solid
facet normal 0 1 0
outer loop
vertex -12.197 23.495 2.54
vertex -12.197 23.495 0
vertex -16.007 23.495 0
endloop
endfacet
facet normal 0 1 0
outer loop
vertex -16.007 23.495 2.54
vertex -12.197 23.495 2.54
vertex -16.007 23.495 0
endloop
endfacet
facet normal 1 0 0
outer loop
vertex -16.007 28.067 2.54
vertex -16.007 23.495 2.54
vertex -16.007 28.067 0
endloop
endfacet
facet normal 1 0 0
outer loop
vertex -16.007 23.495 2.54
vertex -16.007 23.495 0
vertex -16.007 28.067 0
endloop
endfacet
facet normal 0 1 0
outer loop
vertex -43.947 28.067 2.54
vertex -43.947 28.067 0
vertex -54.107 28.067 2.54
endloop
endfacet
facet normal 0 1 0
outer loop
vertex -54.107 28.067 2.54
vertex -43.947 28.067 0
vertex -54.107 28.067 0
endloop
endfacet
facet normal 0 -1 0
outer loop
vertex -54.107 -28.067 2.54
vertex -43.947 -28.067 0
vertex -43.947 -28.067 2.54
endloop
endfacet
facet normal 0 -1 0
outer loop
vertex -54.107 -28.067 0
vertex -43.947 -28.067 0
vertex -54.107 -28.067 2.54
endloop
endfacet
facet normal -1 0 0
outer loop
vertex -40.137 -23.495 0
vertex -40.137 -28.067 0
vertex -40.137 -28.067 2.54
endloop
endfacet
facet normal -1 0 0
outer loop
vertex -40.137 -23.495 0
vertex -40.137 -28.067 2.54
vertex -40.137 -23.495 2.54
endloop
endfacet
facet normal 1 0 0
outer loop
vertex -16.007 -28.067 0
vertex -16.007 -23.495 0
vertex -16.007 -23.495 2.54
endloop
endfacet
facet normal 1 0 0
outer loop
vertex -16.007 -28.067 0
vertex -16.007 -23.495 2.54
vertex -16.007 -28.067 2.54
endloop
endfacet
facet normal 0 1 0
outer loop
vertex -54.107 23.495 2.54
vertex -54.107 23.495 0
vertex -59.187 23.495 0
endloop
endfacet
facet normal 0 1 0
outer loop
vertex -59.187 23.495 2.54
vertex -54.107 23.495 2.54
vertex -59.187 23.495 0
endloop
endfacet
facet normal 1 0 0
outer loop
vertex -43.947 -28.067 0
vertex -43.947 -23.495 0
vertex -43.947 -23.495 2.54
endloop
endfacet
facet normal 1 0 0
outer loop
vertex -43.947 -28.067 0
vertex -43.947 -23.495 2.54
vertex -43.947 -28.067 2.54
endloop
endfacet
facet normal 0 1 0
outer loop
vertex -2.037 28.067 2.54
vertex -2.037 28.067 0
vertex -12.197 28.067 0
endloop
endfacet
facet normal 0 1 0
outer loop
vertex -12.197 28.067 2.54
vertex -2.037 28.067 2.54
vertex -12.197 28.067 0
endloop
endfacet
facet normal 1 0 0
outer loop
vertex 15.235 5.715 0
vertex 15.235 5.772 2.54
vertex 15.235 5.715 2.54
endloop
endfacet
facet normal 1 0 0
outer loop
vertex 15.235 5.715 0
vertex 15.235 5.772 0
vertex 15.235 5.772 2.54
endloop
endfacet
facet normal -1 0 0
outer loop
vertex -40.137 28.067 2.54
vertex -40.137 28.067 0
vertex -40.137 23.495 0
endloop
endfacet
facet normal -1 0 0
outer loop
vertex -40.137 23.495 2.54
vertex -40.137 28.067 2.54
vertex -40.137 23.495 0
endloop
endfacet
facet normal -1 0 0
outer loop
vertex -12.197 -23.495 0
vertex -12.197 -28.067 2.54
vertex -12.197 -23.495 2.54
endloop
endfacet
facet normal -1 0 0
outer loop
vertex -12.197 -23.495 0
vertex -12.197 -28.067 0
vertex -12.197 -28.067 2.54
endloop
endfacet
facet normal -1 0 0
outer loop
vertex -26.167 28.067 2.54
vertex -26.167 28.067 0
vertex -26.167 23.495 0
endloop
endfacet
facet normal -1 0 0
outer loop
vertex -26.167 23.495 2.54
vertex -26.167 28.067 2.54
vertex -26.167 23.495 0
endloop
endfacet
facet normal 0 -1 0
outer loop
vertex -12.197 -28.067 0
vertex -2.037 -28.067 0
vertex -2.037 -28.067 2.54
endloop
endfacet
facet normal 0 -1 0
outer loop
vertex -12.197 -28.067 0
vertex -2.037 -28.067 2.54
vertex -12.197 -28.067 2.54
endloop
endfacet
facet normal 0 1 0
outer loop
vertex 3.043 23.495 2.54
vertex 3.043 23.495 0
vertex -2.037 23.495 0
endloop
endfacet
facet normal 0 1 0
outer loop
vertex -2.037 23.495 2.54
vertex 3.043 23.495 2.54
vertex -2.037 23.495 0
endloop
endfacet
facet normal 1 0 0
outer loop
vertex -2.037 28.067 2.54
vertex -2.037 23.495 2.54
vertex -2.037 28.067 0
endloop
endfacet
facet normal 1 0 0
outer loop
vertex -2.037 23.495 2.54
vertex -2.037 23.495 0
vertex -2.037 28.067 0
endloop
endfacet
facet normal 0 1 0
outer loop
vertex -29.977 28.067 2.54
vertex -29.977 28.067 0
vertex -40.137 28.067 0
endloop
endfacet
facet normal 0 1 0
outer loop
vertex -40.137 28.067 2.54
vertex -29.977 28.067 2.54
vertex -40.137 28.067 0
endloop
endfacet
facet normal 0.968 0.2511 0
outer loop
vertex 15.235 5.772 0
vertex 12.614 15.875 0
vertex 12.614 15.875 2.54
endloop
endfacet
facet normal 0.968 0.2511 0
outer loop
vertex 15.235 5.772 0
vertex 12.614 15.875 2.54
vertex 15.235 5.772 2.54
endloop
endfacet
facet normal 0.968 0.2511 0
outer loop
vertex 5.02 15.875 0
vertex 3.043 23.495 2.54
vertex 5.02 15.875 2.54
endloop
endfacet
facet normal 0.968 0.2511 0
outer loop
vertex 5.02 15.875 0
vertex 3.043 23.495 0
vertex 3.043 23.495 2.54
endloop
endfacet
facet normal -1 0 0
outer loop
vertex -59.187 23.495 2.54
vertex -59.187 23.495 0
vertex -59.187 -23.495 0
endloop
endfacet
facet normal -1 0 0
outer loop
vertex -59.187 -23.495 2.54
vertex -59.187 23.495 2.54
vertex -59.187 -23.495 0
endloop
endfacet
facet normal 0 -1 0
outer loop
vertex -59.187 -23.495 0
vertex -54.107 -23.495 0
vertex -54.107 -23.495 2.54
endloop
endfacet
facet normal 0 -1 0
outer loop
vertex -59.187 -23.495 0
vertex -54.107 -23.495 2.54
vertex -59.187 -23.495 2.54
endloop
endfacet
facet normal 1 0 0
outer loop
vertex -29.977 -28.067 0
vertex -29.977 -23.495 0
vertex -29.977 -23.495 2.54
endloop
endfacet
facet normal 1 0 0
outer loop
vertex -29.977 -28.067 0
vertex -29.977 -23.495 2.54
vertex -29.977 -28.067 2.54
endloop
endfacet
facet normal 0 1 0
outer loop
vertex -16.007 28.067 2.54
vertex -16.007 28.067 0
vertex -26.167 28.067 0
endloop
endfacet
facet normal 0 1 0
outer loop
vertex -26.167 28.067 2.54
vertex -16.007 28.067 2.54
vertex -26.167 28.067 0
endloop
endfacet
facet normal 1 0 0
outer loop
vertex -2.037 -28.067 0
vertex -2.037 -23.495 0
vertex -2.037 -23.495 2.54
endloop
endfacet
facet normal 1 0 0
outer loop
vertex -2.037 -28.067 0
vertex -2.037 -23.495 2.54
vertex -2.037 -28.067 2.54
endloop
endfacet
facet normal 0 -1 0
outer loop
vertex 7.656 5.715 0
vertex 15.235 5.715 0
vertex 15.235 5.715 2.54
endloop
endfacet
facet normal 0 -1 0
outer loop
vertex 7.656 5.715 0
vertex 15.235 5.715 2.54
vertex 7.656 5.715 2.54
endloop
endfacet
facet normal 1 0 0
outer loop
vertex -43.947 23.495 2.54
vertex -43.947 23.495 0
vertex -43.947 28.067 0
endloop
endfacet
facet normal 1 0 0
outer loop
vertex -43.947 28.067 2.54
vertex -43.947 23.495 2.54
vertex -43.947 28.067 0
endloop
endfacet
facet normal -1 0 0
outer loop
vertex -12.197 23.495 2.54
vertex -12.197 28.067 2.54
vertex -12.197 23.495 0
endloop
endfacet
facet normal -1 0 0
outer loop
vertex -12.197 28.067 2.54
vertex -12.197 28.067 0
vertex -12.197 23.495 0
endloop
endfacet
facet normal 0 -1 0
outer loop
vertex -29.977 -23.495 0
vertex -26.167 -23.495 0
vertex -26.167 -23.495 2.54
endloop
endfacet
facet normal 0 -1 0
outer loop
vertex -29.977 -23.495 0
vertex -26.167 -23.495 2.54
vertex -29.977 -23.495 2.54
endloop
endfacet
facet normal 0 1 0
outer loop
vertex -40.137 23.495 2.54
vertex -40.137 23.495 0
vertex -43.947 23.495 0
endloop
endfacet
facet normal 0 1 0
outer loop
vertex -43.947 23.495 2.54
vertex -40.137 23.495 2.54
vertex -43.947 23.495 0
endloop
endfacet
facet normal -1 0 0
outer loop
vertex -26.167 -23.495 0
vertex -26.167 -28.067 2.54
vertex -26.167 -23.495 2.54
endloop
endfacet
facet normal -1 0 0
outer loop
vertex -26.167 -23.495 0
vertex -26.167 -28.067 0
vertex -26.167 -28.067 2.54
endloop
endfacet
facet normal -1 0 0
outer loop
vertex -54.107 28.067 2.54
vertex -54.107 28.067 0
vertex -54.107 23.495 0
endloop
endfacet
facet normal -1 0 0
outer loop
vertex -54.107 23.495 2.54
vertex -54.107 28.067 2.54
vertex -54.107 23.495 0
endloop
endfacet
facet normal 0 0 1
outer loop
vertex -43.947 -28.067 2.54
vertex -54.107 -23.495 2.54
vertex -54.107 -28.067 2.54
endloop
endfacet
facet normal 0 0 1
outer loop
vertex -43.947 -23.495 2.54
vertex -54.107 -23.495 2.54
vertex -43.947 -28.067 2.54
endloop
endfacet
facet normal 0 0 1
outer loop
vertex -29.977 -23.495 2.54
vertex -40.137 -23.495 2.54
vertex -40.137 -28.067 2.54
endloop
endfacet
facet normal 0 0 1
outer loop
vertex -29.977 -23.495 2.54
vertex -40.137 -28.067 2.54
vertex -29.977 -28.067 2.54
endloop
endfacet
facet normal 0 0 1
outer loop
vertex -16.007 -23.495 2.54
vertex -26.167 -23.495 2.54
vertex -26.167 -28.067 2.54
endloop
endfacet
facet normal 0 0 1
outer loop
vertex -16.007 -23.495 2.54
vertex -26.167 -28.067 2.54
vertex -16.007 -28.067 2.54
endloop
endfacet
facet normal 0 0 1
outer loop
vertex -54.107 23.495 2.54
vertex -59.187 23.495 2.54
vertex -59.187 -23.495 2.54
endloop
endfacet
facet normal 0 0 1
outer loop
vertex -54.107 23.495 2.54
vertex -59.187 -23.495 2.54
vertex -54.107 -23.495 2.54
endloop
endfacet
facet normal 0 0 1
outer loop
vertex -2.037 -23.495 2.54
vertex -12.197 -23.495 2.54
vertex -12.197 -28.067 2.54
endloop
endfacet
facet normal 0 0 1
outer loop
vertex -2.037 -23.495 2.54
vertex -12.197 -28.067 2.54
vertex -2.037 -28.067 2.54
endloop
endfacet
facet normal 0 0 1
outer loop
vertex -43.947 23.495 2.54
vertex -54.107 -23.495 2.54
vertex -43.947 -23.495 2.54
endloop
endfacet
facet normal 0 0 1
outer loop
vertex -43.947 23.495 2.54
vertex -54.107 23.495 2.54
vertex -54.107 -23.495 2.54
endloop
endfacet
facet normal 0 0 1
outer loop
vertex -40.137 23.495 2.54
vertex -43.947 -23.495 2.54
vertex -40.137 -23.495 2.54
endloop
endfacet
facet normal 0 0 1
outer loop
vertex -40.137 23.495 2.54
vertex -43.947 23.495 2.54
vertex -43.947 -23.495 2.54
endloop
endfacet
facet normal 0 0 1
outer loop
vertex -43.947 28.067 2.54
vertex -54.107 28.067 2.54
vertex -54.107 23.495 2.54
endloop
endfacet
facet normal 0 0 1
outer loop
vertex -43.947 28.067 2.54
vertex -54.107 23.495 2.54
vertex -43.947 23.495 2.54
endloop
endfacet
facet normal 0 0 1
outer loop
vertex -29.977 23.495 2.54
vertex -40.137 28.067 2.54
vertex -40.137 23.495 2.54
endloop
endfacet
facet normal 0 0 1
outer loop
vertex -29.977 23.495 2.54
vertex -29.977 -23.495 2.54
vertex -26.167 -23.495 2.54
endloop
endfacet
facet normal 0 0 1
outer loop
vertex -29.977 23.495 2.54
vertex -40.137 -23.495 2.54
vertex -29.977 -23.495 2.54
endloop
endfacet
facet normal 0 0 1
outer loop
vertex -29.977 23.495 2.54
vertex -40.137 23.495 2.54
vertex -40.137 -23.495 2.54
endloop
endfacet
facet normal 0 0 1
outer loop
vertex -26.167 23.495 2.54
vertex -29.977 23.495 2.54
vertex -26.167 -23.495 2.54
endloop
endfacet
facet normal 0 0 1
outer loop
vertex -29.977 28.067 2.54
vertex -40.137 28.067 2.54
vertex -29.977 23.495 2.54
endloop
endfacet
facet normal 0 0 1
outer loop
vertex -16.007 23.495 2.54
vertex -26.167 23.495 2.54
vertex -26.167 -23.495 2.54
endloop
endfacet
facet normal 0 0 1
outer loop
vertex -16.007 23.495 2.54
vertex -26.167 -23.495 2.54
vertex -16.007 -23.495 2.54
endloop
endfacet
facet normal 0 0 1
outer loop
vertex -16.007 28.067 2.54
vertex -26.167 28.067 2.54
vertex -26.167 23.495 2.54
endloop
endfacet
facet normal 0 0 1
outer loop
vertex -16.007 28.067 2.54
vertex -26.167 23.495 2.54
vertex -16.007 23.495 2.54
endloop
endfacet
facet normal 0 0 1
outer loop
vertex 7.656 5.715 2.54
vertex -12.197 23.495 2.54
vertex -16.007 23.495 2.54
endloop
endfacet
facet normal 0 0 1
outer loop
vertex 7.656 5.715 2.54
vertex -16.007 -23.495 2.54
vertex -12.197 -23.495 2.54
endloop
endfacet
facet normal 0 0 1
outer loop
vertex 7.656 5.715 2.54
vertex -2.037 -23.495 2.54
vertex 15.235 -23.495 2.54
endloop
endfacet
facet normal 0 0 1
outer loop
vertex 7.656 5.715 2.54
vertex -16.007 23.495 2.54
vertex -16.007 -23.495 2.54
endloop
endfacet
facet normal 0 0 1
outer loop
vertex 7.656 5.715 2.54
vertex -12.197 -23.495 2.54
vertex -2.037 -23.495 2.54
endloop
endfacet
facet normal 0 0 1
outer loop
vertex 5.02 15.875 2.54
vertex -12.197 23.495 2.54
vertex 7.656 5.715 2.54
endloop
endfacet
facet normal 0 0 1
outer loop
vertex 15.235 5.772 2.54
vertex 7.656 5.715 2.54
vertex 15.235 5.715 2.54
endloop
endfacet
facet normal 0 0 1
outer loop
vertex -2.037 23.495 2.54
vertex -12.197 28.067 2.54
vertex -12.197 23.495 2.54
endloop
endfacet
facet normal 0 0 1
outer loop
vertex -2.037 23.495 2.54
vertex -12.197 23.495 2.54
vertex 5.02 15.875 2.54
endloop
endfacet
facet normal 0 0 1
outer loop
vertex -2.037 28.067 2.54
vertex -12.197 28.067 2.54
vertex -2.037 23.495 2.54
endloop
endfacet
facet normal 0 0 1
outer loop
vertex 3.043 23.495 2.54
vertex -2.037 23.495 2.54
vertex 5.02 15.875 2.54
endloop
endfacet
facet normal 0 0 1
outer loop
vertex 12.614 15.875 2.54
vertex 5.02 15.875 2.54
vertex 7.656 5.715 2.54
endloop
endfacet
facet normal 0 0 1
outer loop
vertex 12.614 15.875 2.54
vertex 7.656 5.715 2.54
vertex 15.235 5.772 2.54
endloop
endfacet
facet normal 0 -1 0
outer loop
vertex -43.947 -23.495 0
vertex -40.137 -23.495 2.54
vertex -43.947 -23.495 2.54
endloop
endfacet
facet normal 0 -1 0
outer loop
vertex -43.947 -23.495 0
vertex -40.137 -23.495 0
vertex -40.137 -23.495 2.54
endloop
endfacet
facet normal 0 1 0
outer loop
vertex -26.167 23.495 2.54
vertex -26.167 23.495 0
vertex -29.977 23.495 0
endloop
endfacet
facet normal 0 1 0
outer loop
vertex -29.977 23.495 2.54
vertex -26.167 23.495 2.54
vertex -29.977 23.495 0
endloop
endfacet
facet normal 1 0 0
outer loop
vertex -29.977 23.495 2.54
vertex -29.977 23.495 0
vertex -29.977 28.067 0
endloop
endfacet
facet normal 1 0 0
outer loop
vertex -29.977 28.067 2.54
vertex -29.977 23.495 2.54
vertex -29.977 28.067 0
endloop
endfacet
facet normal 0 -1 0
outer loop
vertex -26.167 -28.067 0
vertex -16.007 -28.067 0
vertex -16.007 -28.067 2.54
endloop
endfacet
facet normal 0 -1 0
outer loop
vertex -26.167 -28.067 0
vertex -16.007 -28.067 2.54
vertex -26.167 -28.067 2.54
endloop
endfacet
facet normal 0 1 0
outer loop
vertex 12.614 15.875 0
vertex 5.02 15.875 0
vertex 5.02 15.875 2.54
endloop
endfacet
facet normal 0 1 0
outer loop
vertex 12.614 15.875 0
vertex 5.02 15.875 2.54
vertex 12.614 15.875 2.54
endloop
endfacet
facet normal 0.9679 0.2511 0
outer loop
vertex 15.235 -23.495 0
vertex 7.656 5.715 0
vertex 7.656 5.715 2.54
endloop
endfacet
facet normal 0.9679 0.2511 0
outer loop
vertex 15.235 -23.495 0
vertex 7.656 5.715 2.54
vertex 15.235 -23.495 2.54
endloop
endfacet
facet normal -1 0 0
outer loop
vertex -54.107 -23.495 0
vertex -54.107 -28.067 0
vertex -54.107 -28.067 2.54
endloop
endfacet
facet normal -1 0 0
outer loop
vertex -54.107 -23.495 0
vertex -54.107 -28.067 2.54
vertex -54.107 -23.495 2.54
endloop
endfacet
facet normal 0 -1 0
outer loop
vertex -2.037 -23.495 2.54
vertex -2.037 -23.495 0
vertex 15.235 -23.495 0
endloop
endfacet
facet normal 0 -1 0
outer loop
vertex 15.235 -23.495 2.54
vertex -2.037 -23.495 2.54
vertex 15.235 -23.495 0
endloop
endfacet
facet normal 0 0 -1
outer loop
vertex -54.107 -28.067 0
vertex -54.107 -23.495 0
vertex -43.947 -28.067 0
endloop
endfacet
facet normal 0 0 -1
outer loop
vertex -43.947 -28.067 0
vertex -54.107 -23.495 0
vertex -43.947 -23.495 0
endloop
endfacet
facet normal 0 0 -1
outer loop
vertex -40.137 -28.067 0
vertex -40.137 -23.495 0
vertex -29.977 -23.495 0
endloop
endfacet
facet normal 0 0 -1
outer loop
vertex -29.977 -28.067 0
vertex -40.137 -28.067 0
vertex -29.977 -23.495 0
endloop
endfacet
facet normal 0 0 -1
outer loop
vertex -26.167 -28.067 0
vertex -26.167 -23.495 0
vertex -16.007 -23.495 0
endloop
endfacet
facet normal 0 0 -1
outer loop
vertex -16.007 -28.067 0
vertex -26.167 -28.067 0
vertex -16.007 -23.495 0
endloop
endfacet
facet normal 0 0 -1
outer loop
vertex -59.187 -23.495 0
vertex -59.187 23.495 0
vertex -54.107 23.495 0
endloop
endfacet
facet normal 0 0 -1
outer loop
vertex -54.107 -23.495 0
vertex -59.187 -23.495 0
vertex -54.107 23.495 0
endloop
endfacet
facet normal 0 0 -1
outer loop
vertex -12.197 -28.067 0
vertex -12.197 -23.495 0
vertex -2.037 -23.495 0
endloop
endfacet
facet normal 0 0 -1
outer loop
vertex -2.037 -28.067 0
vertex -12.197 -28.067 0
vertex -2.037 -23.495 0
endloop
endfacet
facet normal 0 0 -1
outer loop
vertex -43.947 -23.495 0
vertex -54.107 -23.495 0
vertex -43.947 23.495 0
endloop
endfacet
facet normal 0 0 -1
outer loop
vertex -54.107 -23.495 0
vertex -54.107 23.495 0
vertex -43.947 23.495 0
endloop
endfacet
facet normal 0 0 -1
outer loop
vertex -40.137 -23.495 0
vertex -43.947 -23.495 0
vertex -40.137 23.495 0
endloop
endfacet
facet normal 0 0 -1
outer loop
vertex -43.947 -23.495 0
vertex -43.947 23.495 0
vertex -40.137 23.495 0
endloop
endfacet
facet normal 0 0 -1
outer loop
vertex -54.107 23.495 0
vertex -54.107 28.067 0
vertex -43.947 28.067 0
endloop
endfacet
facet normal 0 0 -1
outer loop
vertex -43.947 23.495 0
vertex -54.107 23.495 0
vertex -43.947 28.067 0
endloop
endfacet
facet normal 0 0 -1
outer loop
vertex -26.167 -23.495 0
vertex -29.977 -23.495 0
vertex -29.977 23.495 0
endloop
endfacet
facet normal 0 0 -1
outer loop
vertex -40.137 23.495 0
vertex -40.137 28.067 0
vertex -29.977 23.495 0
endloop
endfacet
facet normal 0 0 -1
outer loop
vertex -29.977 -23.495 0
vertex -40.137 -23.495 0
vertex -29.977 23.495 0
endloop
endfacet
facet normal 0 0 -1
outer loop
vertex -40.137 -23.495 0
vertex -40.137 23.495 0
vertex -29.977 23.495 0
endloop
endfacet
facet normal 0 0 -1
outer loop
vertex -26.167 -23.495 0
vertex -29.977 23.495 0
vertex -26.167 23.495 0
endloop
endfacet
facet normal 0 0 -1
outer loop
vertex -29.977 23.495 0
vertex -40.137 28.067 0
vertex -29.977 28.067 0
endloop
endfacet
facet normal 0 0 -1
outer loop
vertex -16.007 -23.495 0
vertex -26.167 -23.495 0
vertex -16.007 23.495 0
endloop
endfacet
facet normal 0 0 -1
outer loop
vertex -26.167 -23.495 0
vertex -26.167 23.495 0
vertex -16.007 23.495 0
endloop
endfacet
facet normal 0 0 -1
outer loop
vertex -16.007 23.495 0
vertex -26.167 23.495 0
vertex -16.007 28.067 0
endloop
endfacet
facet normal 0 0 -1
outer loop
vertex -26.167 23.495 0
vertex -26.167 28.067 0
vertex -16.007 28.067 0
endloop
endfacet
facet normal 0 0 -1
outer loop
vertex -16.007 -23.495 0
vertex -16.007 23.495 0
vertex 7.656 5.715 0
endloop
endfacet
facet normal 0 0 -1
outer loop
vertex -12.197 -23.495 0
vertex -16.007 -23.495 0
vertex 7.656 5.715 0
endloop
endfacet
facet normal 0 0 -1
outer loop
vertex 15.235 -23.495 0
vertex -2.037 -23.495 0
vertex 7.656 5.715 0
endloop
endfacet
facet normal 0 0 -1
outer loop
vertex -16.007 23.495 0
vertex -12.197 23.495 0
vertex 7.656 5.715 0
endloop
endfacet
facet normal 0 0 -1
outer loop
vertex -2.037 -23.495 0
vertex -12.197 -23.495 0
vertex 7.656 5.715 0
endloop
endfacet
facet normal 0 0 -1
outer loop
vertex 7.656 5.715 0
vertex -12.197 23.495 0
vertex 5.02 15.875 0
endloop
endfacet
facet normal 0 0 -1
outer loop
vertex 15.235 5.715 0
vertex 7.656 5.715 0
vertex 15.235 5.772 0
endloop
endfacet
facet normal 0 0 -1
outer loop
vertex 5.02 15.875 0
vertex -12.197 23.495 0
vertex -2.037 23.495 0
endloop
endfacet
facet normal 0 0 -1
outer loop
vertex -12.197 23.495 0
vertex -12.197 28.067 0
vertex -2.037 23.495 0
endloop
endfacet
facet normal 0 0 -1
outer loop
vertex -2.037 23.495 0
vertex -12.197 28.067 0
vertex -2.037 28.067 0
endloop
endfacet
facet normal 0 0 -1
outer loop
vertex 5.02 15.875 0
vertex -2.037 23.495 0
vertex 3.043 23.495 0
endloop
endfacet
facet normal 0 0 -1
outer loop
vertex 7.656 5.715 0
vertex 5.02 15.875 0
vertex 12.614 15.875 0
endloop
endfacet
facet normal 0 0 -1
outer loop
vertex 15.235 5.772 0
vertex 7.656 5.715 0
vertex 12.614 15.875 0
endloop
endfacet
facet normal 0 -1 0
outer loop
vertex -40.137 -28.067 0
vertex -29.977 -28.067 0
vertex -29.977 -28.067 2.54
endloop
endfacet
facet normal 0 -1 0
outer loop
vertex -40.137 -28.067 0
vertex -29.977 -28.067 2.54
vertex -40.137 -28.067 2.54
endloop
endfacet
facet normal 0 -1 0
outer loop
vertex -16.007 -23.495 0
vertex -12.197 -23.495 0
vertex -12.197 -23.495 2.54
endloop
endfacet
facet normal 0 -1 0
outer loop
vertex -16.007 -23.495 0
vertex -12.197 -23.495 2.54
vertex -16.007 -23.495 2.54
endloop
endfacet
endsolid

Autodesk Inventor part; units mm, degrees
ref_plane "YZ Plane" through (0, 0, 0) normal (1, 0, 0) x (0, 1, 0)
ref_plane "XZ Plane" through (0, 0, 0) normal (0, 1, 0) x (-1, 0, 0)
ref_plane "XY Plane" through (0, 0, 0) normal (0, 0, 1) x (1, 0, 0)
sketch "Sketch1" plane through (0, 0, 0) normal (0, 0, 1) x (1, 0, 0)
  line L0 (-2.037, -23.495) -> (-2.037, -28.067)
  line L1 (-2.037, -28.067) -> (-12.197, -28.067)
  line L2 (-12.197, -28.067) -> (-12.197, -23.495)
  line L3 (-12.197, -23.495) -> (-16.007, -23.495)
  line L4 (-16.007, -23.495) -> (-16.007, -28.067)
  line L5 (-16.007, -28.067) -> (-26.167, -28.067)
  line L6 (-26.167, -28.067) -> (-26.167, -23.495)
  line L7 (-26.167, -23.495) -> (-29.977, -23.495)
  line L8 (-29.977, -23.495) -> (-29.977, -28.067)
  line L9 (-29.977, -28.067) -> (-40.137, -28.067)
  line L10 (-40.137, -28.067) -> (-40.137, -23.495)
  line L11 (-40.137, -23.495) -> (-43.947, -23.495)
  line L12 (-43.947, -23.495) -> (-43.947, -28.067)
  line L13 (-43.947, -28.067) -> (-54.107, -28.067)
  line L14 (-54.107, -28.067) -> (-54.107, -23.495)
  line L15 (-54.107, -23.495) -> (-59.187, -23.495)
  line L16 (3.043, 23.495) -> (-2.037, 23.495)
  line L17 (-2.037, 23.495) -> (-2.037, 28.067)
  line L18 (-2.037, 28.067) -> (-12.197, 28.067)
  line L19 (-12.197, 28.067) -> (-12.197, 23.495)
  line L20 (-12.197, 23.495) -> (-16.007, 23.495)
  line L21 (-16.007, 23.495) -> (-16.007, 28.067)
  line L22 (-16.007, 28.067) -> (-26.167, 28.067)
  line L23 (-26.167, 28.067) -> (-26.167, 23.495)
  line L24 (-26.167, 23.495) -> (-29.977, 23.495)
  line L25 (-29.977, 23.495) -> (-29.977, 28.067)
  line L26 (-29.977, 28.067) -> (-40.137, 28.067)
  line L27 (-40.137, 28.067) -> (-40.137, 23.495)
  line L28 (-40.137, 23.495) -> (-43.947, 23.495)
  line L29 (-43.947, 23.495) -> (-43.947, 28.067)
  line L30 (-43.947, 28.067) -> (-54.107, 28.067)
  line L31 (-54.107, 28.067) -> (-54.107, 23.495)
  line L32 (-54.107, 23.495) -> (-59.187, 23.495)
  line L33 (-59.187, 23.495) -> (-59.187, -23.495)
  line L34 (15.235, 5.7718) -> (15.235, 5.715)
  line L35 (15.235, 5.715) -> (7.6562, 5.715)
  line L36 (12.6136, 15.875) -> (15.235, 5.7718)
  line L37 (3.043, 23.495) -> (5.0201, 15.875)
  line L38 (7.6562, 5.715) -> (15.235, -23.495)
  line L39 (5.0201, 15.875) -> (12.6136, 15.875)
  line L40 (-2.037, -23.495) -> (15.235, -23.495)
  dimension "d11" = 4.572
  dimension "d12" = 10.16
  dimension "d13" = 3.81
  dimension "d14" = 10.16
  dimension "d15" = 3.81
  dimension "d16" = 10.16
  dimension "d17" = 3.81
  dimension "d18" = 10.16
  dimension "d19" = 5.08
  dimension "d34" = 4.572
  dimension "d84" = 7.62
  dimension "d85" = 29.21
  dimension "d86" = 10.1032
extrude "Extrusion4" add sketch "Sketch1" along normal blind 2.54
properties part number "RTS Frame Sides"
